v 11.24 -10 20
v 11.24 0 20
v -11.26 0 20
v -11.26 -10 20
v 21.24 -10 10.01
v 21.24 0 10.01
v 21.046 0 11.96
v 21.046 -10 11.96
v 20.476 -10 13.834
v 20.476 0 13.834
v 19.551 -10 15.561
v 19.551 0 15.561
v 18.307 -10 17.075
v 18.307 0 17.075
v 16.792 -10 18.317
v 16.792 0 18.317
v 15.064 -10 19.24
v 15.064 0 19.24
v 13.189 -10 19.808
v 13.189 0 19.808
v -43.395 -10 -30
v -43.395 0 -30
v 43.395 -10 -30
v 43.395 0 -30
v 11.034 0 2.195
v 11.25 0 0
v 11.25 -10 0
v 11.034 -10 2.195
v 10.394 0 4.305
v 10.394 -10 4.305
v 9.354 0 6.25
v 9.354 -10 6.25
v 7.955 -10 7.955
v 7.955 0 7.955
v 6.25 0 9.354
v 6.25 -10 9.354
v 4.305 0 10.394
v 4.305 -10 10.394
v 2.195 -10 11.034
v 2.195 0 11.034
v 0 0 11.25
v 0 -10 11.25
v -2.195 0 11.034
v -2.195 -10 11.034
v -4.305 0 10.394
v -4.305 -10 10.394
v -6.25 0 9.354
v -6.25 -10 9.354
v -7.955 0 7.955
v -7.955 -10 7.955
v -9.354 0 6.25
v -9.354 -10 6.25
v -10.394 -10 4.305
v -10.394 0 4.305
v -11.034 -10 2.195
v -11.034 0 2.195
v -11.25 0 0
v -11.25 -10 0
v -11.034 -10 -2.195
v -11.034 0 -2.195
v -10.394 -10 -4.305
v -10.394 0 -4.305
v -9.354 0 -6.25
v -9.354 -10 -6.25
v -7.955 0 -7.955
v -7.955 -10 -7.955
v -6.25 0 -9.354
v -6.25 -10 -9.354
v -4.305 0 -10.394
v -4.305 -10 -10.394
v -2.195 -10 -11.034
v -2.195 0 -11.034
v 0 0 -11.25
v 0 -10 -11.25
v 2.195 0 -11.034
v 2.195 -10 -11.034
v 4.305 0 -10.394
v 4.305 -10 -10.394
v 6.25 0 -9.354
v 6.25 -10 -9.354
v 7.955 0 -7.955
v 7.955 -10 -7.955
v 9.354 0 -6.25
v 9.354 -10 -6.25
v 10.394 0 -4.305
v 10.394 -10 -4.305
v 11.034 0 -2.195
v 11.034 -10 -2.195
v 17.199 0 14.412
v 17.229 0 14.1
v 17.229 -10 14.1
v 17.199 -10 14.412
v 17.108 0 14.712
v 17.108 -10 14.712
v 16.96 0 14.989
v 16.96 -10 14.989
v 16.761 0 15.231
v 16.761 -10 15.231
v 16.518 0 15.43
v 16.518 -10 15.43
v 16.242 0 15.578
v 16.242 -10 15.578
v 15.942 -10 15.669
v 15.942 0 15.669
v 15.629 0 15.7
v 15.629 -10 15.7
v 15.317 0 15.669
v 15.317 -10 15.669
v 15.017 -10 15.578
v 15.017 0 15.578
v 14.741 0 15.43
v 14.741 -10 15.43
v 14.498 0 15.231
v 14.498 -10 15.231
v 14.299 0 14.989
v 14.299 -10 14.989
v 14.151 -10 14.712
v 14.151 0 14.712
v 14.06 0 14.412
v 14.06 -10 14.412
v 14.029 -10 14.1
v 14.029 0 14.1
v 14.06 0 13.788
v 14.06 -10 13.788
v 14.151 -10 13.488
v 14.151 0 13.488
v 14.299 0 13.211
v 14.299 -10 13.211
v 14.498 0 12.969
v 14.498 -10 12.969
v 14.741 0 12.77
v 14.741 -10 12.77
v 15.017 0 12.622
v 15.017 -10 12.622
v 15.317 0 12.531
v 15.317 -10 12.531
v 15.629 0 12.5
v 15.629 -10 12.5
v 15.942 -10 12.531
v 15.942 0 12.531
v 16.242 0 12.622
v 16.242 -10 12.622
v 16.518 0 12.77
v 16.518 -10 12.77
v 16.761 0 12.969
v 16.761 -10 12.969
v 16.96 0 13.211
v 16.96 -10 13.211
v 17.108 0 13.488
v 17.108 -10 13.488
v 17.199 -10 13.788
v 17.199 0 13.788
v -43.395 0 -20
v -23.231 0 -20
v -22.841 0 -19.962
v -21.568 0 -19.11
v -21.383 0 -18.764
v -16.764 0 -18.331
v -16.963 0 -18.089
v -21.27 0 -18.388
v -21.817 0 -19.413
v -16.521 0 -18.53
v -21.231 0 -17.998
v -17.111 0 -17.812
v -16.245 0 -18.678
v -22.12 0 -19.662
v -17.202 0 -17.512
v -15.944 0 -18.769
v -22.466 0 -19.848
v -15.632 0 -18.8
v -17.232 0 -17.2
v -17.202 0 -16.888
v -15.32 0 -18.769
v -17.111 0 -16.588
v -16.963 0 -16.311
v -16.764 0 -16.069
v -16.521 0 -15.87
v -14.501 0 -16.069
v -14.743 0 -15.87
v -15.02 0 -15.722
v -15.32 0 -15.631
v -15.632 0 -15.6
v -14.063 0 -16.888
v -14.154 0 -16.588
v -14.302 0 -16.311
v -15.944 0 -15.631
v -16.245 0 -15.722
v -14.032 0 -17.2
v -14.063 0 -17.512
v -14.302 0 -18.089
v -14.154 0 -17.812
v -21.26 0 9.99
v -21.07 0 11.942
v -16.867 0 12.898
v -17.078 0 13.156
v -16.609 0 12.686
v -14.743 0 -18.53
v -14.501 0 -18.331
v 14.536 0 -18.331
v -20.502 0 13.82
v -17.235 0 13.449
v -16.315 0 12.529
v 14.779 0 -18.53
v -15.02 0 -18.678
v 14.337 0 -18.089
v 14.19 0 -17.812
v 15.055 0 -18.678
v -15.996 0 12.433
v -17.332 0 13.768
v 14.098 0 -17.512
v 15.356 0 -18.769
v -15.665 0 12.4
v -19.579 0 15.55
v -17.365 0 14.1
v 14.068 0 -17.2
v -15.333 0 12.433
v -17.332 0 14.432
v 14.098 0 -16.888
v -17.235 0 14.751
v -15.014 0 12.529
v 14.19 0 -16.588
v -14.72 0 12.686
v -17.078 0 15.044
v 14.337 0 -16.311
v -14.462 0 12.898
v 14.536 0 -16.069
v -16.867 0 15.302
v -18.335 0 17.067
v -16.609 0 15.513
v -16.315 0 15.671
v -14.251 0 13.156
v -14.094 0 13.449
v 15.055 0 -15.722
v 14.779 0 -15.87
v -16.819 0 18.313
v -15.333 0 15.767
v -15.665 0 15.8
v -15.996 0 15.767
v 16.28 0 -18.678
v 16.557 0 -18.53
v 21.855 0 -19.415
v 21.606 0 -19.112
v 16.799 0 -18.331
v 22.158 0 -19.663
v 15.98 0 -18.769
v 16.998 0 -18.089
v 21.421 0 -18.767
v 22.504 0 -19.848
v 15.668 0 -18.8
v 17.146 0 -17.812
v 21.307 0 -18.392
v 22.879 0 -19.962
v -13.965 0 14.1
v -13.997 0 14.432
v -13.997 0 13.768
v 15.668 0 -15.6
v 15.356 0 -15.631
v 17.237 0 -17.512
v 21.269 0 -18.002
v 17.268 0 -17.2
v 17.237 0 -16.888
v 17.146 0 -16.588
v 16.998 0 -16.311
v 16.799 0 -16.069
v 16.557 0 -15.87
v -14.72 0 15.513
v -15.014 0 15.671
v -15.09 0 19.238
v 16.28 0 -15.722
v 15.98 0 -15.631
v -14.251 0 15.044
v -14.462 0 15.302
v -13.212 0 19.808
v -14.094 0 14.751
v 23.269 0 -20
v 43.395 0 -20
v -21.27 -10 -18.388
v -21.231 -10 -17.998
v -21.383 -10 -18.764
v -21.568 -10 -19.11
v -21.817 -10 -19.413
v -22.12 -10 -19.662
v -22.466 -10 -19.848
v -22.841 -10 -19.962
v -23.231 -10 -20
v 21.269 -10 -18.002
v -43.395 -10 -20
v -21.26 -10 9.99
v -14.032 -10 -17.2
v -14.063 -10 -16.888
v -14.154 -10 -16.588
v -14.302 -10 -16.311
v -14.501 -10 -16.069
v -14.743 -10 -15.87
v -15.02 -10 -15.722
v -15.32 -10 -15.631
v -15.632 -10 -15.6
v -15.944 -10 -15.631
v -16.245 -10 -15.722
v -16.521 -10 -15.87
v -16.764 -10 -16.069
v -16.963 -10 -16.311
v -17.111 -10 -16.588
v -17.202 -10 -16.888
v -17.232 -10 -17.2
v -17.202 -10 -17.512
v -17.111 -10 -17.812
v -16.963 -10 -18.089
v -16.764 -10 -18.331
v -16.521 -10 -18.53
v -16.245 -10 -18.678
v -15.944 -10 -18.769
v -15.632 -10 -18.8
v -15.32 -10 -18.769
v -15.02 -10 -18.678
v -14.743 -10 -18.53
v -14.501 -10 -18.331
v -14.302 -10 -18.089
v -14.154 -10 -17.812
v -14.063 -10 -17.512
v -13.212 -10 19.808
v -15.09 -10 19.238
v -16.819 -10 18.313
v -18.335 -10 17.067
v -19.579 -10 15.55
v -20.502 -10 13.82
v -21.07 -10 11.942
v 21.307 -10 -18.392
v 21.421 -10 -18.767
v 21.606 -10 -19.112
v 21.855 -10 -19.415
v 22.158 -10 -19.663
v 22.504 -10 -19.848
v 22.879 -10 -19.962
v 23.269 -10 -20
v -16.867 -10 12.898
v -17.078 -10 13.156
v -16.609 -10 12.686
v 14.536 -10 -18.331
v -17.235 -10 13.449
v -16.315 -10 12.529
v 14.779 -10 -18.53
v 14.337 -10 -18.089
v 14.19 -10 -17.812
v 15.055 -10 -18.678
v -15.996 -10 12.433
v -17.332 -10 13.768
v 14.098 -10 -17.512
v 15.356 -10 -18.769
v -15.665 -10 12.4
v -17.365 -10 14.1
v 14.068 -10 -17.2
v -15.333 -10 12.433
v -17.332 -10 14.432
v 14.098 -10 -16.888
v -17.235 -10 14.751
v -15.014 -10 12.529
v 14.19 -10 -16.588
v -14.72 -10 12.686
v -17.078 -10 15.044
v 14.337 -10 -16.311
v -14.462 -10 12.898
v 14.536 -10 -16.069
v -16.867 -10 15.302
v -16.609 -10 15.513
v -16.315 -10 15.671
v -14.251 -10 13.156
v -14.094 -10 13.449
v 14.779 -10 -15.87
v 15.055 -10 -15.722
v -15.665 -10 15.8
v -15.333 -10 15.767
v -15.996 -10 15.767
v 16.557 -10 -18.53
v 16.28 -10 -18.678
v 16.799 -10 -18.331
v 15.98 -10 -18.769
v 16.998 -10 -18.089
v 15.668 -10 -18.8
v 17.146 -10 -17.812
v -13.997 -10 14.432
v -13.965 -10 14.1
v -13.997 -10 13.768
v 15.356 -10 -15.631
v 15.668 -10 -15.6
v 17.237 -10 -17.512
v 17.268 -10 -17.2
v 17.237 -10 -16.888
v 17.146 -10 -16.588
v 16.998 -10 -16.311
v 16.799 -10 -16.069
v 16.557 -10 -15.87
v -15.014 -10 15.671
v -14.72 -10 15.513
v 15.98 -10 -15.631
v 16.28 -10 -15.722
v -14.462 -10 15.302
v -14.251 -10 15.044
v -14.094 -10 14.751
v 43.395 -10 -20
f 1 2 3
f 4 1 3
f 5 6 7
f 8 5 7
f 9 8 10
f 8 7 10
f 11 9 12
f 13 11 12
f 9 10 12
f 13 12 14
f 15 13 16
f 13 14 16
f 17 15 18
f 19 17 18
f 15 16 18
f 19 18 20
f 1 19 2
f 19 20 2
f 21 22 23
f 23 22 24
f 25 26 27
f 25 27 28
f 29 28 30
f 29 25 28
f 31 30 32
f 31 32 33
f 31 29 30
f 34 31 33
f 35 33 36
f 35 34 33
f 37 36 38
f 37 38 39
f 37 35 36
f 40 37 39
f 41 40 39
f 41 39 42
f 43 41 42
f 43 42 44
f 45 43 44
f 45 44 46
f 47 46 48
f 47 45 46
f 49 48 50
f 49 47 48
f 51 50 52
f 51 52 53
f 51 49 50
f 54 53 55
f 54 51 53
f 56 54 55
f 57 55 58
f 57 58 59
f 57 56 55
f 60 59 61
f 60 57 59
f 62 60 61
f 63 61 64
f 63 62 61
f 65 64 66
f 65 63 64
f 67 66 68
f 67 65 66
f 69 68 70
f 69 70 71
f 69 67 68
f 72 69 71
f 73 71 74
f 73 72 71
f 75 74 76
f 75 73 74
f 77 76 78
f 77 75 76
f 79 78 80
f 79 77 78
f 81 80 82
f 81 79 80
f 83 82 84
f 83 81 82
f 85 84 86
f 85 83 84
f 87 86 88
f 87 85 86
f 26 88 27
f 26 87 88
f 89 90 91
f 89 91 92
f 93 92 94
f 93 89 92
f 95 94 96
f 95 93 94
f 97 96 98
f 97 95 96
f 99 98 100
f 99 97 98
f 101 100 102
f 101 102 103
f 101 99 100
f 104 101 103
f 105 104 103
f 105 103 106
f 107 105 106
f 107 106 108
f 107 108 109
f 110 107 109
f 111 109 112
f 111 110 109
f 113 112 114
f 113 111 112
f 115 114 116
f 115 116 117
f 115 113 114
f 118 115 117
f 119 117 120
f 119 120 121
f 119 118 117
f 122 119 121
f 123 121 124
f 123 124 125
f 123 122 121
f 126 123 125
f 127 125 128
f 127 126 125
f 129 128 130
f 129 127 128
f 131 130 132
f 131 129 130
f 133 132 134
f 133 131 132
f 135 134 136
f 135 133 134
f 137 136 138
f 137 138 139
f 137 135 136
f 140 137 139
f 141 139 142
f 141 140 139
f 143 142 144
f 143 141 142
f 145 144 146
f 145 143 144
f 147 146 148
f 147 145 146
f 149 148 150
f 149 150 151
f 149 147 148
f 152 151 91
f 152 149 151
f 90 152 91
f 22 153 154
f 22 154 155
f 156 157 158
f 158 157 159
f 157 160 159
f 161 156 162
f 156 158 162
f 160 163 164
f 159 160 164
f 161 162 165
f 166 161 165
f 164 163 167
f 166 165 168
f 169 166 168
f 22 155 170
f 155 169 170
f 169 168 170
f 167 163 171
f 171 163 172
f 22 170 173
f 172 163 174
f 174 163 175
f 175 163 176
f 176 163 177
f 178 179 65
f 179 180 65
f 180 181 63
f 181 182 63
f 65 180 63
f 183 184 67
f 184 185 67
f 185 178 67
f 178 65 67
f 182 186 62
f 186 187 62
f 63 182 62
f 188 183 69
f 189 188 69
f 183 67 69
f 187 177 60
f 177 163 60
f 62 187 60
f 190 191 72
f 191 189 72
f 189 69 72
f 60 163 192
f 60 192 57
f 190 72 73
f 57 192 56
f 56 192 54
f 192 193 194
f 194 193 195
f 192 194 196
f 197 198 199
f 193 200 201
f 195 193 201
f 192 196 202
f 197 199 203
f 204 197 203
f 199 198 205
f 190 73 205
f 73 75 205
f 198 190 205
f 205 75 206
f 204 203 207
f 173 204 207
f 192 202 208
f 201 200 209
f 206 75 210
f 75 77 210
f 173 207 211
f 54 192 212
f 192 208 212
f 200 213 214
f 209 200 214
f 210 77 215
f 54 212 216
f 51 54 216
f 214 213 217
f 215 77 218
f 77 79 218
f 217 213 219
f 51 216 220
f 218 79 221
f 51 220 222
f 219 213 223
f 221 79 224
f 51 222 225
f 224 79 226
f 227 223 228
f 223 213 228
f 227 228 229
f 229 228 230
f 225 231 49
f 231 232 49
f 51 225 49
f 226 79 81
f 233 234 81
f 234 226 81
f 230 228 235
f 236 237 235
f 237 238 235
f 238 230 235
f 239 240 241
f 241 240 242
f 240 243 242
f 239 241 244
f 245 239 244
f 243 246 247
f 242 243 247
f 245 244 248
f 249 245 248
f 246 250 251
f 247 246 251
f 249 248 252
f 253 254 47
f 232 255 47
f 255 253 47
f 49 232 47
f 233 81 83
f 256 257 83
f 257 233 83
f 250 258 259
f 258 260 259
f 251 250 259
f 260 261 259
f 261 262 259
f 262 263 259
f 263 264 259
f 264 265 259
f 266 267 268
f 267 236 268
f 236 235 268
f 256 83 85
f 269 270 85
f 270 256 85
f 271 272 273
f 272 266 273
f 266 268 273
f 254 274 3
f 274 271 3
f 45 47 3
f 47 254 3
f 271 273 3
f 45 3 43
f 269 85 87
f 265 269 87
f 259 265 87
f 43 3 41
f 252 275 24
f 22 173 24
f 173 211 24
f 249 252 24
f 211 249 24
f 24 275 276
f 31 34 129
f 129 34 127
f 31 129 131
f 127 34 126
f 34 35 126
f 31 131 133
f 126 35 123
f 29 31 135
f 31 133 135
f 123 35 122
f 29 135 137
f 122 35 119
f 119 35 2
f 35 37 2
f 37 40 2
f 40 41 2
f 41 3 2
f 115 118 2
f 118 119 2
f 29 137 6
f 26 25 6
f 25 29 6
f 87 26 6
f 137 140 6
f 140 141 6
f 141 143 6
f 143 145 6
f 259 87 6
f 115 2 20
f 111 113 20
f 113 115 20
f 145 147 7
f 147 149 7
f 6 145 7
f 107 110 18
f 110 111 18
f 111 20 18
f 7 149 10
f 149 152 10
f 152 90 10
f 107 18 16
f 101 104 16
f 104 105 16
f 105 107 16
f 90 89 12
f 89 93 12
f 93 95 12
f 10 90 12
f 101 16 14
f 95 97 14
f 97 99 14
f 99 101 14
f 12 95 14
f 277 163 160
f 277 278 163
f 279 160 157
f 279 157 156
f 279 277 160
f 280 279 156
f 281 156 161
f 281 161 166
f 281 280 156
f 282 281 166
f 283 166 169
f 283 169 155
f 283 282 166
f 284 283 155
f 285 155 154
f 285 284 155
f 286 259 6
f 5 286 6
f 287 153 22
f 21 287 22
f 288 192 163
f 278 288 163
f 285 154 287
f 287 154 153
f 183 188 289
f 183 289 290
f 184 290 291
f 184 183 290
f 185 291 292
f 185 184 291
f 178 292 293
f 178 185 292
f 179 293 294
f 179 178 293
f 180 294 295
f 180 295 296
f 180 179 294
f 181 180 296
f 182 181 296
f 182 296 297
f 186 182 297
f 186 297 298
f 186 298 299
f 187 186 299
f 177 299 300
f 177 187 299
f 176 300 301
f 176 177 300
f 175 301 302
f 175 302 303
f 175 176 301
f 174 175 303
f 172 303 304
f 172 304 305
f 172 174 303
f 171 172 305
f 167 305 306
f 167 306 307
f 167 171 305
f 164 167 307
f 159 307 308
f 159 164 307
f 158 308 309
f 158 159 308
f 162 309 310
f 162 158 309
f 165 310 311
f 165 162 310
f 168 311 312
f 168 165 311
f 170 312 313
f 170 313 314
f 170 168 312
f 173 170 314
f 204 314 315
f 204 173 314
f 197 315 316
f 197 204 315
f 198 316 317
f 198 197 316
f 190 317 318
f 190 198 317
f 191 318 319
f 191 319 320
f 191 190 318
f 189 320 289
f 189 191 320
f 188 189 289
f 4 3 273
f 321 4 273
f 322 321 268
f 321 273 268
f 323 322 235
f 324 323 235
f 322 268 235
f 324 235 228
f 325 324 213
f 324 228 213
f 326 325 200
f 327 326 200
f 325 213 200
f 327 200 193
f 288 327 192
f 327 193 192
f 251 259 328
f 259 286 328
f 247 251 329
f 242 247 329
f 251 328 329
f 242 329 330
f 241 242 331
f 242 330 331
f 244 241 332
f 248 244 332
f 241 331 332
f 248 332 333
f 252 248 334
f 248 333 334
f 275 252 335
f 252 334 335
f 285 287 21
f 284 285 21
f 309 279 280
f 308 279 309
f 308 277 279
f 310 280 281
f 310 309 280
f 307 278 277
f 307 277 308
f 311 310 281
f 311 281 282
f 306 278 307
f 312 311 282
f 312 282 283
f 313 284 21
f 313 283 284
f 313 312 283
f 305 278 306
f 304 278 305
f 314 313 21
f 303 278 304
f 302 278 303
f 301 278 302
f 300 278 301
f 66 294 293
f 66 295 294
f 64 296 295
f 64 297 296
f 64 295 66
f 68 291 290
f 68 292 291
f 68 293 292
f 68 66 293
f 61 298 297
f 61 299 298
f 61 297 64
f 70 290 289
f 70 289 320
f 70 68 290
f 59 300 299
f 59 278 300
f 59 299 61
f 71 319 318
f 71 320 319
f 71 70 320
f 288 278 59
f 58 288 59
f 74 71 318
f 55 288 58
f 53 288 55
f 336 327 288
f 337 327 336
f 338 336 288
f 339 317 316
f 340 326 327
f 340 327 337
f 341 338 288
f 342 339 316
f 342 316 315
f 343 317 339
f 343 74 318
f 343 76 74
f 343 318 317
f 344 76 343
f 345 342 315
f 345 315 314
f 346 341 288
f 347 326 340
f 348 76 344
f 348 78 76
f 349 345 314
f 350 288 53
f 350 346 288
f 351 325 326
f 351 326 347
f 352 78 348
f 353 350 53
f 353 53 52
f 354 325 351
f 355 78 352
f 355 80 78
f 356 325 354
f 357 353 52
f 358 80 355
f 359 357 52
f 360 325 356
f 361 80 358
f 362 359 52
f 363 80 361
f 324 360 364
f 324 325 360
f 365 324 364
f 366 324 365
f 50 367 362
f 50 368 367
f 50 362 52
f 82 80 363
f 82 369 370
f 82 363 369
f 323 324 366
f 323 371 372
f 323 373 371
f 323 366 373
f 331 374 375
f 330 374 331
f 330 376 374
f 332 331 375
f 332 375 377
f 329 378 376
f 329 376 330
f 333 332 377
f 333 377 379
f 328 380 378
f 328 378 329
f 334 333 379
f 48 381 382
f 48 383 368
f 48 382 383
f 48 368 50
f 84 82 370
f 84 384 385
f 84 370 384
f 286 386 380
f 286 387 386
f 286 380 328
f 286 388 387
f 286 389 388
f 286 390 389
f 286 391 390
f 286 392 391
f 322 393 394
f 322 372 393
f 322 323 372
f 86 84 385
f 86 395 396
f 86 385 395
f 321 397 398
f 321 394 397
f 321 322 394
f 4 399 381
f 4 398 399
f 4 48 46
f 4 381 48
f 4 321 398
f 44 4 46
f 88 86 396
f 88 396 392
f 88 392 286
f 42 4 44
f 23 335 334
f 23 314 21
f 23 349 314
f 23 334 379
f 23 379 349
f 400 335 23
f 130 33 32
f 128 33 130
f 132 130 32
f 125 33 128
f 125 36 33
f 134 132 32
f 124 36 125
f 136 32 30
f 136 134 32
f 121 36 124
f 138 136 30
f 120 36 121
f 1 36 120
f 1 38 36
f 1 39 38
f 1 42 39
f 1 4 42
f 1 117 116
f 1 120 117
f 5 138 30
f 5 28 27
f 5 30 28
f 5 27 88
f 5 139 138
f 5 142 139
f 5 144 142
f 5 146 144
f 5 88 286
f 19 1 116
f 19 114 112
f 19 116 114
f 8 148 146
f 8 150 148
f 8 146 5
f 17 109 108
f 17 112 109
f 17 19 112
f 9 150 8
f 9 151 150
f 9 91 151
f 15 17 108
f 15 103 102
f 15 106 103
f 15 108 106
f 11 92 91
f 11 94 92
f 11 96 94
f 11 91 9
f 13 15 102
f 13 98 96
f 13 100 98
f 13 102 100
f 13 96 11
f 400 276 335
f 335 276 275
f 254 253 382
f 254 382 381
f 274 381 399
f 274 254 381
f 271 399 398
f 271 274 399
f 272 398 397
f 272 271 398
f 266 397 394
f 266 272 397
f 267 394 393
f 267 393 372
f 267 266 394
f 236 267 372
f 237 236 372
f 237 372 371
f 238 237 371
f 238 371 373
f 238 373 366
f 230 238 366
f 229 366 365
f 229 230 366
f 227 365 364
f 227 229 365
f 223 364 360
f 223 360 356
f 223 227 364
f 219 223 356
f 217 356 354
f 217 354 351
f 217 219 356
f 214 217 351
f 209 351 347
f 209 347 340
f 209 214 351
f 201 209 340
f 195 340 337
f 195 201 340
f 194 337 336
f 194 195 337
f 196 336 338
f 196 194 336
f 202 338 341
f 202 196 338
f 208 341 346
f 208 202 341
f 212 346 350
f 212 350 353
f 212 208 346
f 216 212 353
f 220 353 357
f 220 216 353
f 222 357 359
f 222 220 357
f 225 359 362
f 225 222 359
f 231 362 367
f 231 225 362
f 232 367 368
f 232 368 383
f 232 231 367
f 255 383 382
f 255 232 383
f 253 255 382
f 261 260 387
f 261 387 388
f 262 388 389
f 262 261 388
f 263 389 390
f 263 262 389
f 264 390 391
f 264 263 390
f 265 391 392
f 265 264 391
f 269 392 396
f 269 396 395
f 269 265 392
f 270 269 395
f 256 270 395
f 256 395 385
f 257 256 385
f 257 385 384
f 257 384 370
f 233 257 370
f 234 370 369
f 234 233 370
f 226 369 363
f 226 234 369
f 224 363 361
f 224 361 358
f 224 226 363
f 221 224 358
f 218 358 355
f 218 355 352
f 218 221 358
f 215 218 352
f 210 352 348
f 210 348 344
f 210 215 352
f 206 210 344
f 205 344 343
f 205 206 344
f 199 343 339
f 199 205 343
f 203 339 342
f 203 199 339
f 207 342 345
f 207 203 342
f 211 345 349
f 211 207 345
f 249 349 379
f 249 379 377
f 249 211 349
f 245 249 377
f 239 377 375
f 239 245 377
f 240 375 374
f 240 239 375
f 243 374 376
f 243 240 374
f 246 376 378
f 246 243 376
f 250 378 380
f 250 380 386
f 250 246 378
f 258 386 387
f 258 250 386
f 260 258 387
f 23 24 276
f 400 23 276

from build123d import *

# Parameters (mm, degrees)
F0_R     = 1.6
F0_R_2   = 1.7
F0_R_3   = 11.25
F1_DEPTH = 10
F2_R     = 2


# Not quite as in the source:
# - a feature of the source that left no trace in its solid (it failed there, or was rolled back) is left out


with BuildPart() as f1:
    # F0 (on Front) → F1 (new body)
    with BuildSketch(Plane.XZ):
        with BuildLine():
            Line((11.2397133785, 19.9999894063), (-11.2602985395, 19.9999894063))
            ThreePointArc((-11.2602985395, 19.9999894063), (-18.3350043941, 17.0674173026), (-21.2602932426, 9.9896968203))
            Line((-21.2602932426, 9.9896968203), (-21.229426084, -19.9999894063))
            Line((-21.229426084, -19.9999894063), (-43.3949531186, -19.9999894063))
            Line((-43.3949531186, -19.9999894063), (-43.3949531186, -29.9999894063))
            Line((-43.3949531186, -29.9999894063), (43.3949531186, -29.9999894063))
            Line((43.3949531186, -29.9999894063), (43.3949531186, -19.9999894063))
            Line((43.3949531186, -19.9999894063), (21.2705964277, -19.9999894063))
            Line((21.2705964277, -19.9999894063), (21.2397080816, 10.0102819922))
            ThreePointArc((21.2397080816, 10.0102819922), (18.3071412749, 17.0746952609), (11.2397133785, 19.9999894063))
        make_face()
        with Locations((-15.6323080096, -17.1999894063)):
            Circle(F0_R, mode=Mode.SUBTRACT)
        with Locations((15.6677115429, -17.1999961863)):
            Circle(F0_R, mode=Mode.SUBTRACT)
        with Locations((-15.6645237988, 14.0999894063)):
            Circle(F0_R_2, mode=Mode.SUBTRACT)
        Circle(F0_R_3, mode=Mode.SUBTRACT)
        with Locations((15.629426084, 14.0999894063)):
            Circle(F0_R, mode=Mode.SUBTRACT)
    extrude(amount=F1_DEPTH)

    # F2
    f2_edges = [f1.edges().sort_by_distance(p)[0] for p in [
        (21.270596, -5, -19.999989),
        (-21.229426, -5, -19.999989),
    ]]
    fillet(f2_edges, radius=F2_R)


solid = f1.part
